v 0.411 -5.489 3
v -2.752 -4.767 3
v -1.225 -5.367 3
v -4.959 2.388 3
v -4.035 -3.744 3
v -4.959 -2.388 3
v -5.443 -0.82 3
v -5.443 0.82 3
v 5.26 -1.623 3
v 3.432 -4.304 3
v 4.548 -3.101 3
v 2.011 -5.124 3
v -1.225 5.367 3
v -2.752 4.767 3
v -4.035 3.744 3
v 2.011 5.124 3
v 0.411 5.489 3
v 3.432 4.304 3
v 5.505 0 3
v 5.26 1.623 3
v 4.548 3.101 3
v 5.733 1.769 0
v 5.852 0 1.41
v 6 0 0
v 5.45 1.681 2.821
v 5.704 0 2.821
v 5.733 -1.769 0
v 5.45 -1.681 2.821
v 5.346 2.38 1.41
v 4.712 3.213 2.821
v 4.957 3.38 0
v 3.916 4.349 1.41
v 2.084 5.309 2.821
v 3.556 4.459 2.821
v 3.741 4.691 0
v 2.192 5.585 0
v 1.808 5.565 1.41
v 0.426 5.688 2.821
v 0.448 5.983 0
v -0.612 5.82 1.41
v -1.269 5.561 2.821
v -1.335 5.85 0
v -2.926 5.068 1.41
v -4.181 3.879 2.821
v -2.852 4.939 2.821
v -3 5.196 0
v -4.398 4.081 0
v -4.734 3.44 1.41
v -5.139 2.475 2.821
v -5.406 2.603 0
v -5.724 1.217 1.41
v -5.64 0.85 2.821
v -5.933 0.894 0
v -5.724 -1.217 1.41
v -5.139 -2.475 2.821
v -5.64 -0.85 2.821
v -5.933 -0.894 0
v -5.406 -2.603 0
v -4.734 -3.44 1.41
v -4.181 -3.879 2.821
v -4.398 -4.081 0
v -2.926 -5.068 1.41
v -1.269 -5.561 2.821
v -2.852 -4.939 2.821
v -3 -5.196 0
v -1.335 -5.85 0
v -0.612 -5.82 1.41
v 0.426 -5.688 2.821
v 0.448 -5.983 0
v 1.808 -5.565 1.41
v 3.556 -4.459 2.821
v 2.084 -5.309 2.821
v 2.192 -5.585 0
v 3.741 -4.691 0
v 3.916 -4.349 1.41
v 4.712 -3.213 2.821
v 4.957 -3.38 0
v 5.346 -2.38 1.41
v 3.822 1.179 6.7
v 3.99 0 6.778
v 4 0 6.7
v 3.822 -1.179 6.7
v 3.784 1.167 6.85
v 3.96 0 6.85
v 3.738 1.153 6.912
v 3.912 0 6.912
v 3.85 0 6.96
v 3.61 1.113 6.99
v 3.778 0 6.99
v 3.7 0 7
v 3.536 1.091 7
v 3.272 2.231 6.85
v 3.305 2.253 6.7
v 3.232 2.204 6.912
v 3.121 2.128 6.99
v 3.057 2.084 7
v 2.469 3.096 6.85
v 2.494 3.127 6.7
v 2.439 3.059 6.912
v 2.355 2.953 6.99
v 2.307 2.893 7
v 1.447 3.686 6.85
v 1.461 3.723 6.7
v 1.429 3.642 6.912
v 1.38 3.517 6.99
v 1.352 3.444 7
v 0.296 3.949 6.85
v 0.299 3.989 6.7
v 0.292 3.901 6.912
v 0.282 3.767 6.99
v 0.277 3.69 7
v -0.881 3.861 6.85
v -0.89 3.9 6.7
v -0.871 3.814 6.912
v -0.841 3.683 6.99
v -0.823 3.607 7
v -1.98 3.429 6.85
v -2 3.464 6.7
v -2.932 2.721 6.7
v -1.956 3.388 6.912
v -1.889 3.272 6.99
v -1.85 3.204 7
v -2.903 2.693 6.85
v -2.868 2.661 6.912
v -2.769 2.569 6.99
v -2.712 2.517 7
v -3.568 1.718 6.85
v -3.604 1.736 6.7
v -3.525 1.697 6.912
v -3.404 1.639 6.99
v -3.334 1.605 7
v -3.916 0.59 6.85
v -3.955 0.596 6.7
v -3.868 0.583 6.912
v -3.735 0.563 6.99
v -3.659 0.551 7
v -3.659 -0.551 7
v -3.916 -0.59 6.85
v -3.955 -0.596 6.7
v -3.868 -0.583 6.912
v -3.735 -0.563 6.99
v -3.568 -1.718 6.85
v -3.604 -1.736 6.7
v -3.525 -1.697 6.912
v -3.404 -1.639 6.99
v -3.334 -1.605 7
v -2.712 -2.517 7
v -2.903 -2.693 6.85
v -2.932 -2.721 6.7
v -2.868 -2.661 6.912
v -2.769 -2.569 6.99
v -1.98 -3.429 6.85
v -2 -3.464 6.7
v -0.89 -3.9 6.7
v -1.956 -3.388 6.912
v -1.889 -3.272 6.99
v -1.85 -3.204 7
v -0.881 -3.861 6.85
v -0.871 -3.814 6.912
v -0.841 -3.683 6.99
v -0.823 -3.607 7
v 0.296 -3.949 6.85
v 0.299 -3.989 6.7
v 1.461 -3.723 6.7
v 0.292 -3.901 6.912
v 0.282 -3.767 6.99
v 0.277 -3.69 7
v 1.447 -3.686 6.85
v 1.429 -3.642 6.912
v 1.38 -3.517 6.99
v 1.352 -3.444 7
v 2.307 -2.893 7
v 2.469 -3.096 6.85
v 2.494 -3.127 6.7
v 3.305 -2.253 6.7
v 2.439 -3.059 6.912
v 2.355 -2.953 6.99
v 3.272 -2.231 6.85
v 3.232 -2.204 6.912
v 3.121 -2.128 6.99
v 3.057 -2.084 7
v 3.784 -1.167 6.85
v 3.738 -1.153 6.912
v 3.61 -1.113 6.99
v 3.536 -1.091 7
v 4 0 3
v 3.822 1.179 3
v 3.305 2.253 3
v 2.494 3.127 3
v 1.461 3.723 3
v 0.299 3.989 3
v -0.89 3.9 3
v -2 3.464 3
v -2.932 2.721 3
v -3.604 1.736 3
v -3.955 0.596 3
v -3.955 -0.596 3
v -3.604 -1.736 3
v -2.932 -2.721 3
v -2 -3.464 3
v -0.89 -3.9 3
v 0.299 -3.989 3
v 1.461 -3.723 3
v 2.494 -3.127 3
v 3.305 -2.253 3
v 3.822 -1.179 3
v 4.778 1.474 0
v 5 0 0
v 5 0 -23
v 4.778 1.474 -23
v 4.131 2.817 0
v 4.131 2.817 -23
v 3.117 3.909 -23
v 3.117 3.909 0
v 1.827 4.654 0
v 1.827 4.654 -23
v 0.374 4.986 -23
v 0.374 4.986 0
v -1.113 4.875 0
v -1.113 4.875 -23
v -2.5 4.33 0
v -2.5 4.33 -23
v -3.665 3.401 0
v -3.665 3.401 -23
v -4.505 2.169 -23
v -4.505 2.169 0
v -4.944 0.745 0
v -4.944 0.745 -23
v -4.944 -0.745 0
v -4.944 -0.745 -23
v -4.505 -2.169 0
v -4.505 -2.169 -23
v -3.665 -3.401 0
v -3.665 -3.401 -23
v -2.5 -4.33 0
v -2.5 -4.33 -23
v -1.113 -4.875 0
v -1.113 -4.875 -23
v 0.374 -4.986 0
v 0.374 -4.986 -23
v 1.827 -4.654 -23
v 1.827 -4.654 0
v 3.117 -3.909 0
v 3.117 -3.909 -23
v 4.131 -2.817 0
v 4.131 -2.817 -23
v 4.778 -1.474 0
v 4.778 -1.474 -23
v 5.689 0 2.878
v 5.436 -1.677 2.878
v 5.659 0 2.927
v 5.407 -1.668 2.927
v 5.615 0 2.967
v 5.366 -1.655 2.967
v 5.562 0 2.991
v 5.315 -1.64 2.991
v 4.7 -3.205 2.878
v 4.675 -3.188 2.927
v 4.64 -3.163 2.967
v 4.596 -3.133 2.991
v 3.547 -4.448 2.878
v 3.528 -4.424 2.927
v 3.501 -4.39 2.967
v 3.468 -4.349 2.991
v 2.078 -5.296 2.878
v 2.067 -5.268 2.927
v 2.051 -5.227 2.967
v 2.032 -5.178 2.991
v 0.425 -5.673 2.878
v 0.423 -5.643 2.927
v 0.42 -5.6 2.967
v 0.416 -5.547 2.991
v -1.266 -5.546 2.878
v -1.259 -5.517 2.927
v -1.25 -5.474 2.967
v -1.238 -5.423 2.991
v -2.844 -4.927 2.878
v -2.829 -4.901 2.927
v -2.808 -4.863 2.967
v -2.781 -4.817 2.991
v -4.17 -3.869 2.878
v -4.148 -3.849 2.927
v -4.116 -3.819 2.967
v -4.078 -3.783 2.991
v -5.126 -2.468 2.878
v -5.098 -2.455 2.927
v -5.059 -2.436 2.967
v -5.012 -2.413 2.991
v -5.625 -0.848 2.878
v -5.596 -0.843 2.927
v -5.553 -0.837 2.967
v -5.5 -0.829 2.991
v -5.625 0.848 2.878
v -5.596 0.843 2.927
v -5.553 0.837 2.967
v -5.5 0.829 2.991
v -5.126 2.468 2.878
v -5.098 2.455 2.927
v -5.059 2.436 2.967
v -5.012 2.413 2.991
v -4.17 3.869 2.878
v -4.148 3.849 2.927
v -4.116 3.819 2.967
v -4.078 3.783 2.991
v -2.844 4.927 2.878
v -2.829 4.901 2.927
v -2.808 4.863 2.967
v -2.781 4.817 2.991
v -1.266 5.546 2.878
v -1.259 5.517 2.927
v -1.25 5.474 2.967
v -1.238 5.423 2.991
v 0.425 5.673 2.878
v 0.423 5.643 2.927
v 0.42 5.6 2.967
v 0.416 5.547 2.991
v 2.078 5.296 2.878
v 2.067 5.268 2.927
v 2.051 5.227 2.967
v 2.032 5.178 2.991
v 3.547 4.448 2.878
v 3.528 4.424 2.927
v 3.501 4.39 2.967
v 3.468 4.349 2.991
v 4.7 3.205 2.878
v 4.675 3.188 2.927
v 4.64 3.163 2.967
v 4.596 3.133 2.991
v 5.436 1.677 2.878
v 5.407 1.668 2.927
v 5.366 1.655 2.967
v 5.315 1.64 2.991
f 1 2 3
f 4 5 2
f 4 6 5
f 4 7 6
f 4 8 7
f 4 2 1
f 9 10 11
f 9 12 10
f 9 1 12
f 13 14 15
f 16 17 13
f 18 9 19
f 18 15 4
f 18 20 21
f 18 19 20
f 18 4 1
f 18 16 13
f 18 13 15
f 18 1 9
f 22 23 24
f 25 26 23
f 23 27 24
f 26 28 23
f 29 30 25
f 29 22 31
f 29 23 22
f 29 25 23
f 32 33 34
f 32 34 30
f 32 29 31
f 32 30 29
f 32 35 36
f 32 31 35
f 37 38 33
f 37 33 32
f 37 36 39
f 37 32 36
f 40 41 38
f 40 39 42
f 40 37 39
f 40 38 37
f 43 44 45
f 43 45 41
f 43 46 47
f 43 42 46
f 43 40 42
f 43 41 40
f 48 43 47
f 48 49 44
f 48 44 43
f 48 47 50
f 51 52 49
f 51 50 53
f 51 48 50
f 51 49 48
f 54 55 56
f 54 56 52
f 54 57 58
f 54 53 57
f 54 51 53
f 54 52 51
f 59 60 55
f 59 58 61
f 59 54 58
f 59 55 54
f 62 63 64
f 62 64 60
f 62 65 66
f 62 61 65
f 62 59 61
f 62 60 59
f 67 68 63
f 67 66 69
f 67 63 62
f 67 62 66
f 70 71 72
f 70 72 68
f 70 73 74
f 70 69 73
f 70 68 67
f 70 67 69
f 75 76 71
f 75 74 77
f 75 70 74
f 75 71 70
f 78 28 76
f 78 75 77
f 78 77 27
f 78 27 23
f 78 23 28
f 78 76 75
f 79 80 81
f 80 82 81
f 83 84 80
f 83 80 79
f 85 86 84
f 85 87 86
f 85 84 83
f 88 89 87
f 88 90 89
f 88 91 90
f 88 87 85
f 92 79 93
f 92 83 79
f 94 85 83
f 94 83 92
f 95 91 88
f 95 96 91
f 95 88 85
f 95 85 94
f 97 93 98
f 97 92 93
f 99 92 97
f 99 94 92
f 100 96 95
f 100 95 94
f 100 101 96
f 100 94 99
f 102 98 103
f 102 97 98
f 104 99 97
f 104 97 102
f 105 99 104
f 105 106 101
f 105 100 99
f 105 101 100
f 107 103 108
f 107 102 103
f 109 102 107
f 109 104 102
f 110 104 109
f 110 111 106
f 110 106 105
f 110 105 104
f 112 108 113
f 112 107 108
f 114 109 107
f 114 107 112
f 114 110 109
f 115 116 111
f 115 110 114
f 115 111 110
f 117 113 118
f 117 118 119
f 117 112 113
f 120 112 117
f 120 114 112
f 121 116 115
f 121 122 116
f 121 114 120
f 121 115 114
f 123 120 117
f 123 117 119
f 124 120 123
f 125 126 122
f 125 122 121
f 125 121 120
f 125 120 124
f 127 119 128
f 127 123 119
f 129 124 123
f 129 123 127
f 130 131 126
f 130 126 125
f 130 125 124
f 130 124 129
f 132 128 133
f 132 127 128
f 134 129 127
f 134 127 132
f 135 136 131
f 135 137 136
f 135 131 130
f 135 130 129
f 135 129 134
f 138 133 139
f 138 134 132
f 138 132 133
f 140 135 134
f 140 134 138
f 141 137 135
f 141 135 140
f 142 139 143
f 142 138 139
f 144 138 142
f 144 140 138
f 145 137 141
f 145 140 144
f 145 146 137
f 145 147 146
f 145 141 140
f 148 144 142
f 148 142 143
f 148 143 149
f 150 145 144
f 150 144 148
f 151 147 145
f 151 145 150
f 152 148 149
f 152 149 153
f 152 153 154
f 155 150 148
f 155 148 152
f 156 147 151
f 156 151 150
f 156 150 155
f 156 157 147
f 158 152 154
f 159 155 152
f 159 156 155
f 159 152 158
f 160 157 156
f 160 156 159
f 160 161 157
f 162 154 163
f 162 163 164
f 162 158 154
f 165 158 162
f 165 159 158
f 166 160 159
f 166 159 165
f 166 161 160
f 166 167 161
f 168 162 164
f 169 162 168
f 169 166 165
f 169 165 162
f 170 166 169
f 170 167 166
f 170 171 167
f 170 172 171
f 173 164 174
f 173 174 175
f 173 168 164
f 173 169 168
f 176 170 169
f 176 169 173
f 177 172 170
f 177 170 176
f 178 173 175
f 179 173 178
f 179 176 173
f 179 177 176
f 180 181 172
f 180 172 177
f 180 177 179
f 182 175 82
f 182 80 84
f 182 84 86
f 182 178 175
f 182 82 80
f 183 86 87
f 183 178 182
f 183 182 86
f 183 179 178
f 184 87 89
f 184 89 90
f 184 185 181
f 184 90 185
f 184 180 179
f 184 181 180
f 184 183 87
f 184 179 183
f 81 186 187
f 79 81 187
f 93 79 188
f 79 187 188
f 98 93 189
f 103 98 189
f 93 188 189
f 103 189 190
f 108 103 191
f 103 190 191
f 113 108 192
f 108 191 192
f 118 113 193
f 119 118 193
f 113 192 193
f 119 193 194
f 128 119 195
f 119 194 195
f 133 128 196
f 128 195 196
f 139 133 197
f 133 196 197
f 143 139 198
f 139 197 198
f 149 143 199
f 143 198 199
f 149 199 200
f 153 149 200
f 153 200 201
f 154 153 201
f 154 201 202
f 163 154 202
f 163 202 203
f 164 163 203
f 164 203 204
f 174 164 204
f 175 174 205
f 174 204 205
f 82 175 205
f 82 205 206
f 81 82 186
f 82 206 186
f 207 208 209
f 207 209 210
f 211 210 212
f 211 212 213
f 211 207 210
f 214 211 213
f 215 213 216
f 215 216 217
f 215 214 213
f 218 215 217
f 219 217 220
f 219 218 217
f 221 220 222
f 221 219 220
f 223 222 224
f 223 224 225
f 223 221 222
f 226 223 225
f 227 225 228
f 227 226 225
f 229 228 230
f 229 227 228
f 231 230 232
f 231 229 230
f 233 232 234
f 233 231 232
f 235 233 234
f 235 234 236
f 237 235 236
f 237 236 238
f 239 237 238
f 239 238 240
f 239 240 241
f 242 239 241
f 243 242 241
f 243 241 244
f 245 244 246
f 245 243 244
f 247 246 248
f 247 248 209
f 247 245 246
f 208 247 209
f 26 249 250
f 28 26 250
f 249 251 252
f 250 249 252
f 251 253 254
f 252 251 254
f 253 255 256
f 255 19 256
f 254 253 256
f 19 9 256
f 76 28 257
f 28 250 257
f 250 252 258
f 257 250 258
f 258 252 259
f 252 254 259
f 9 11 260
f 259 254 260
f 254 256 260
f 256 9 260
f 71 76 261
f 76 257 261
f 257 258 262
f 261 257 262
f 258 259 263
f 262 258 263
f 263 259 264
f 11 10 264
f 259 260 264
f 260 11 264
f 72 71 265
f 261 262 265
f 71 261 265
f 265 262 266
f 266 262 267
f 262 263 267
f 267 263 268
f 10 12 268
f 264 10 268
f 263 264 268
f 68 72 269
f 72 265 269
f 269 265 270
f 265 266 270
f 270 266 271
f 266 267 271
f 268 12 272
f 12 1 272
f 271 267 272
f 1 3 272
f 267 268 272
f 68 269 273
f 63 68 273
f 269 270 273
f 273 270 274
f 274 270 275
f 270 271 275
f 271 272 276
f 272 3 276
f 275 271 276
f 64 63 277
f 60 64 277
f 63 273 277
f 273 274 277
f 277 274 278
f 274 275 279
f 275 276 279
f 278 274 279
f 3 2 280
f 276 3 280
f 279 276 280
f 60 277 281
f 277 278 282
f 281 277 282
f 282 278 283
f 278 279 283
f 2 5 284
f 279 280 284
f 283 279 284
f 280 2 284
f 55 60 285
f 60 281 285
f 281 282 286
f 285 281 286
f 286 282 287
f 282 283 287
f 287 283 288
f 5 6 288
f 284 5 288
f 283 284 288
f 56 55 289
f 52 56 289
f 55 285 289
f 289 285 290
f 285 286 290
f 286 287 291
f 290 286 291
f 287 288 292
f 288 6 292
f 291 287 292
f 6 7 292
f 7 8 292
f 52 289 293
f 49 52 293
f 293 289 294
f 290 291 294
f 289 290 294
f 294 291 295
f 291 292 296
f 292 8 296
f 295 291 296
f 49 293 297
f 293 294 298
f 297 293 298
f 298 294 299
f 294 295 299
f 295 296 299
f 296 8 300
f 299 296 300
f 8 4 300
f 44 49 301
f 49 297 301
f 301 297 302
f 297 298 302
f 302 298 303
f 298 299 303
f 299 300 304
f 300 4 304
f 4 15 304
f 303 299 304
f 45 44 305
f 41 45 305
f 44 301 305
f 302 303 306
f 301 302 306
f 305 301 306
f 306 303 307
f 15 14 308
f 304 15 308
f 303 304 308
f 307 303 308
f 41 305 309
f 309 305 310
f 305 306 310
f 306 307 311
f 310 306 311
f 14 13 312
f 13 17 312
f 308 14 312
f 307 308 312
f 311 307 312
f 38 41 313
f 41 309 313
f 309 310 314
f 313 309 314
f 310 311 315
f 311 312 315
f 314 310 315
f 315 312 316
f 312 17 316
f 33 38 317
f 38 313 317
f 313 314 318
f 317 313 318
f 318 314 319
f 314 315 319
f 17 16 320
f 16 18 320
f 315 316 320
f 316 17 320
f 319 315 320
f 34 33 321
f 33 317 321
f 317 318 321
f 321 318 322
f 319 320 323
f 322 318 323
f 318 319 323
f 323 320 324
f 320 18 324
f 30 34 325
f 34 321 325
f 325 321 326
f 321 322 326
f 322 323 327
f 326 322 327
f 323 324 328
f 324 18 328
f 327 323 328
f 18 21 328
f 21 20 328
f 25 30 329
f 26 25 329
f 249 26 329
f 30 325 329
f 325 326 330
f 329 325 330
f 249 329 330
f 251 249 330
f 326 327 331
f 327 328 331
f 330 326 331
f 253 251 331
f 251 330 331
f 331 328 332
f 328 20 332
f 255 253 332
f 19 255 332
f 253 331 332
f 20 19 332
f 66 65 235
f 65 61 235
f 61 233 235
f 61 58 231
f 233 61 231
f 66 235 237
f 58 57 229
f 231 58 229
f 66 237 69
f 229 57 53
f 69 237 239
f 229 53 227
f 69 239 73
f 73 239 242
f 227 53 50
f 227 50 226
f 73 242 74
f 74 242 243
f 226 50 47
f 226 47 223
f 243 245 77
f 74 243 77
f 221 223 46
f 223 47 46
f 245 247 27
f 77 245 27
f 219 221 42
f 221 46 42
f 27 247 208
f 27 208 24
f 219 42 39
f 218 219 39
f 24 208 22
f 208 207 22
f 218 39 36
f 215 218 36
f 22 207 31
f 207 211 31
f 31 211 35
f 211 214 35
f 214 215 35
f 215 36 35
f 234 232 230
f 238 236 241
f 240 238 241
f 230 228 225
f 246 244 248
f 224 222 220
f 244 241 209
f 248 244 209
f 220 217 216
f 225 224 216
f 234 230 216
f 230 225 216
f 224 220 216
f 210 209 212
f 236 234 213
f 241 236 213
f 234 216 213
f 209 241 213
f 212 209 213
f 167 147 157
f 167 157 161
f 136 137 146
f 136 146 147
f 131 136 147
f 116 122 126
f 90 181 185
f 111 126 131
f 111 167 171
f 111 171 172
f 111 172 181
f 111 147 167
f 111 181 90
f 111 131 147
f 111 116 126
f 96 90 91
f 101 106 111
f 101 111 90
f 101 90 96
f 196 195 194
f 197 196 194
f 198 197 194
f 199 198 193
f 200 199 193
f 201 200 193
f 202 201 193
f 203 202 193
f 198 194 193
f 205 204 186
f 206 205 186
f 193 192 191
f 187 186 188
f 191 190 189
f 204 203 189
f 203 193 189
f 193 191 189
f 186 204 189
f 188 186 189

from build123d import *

# Parameters (mm, degrees)
ESBO_O1_R                = 5
RESSALTO_EXTRUS_O1_DEPTH = 23
ESBO_O2_R                = 6
RESSALTO_EXTRUS_O2_DEPTH = 3
RESSALTO_EXTRUS_O2_TAPER = 6
FILETE1_R                = 0.2
ESBO_O3_R                = 4
RESSALTO_EXTRUS_O3_DEPTH = 4
FILETE2_R                = 0.3


with BuildPart() as part:
    # Esboço1 → Ressalto-extrusão1 (new body)
    with BuildSketch(Plane.XY):
        Circle(ESBO_O1_R)
    extrude(amount=-RESSALTO_EXTRUS_O1_DEPTH)

    # Esboço2 → Ressalto-extrusão2 (add)
    with BuildSketch(Plane.XY):
        Circle(ESBO_O2_R)
    extrude(amount=RESSALTO_EXTRUS_O2_DEPTH, taper=RESSALTO_EXTRUS_O2_TAPER)

    # Filete1
    filete1_edges = [part.edges().sort_by_distance(p)[0] for p in [
        (-5.684687294, 0, 3),
    ]]
    fillet(filete1_edges, radius=FILETE1_R)


with BuildPart() as body_2:
    # Esboço3 → Ressalto-extrusão3 (new body)
    with BuildSketch(Plane.XY.offset(3)):
        Circle(ESBO_O3_R)
    extrude(amount=RESSALTO_EXTRUS_O3_DEPTH)

    # Filete2
    filete2_edges = [body_2.edges().sort_by_distance(p)[0] for p in [
        (-4, 0, 7),
    ]]
    fillet(filete2_edges, radius=FILETE2_R)


solid = Compound([part.part, body_2.part])
